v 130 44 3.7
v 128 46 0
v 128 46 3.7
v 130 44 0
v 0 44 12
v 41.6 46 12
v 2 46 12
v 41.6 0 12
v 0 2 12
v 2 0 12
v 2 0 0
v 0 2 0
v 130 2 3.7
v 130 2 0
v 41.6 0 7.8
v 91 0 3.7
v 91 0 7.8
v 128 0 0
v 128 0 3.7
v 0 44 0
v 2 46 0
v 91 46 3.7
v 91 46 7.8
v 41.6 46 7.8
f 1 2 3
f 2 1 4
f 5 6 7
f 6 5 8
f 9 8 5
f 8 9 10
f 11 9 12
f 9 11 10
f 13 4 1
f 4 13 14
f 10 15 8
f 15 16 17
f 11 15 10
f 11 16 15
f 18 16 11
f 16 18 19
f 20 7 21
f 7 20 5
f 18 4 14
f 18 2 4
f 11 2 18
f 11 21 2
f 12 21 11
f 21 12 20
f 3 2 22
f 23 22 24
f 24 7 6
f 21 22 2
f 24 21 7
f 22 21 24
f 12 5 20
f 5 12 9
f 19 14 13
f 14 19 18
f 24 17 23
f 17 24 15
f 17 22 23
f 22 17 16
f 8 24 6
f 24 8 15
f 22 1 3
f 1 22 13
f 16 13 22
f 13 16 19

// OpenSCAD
$fn = 32;

// ----------------------------------------------------------------------
// Stepped bar: twostep, 130 x 46 x 12/3.7 mm
// ----------------------------------------------------------------------

// --- parameters (mm) ---
bar_l = 130;              // bar length, X
bar_w = 46;               // bar width, Y
plate_t = 12;             // thickness of the thick zone, Z
thin_t = 3.7;             // thickness of the thin zone
corner_c = 2;             // corner chamfer of the bar
step_cut = 8.3;           // material removed from the thin zone
stair1_x = 41.6;          // position of the first stair
stair2_x = 91;            // position of the second stair
mid_t = 7.8;              // thickness of the middle zone
depth_1 = 4.2;            // depth of cut 1 from the top face
depth_2 = 8.3;            // depth of cut 2 from the top face
fit_tol = 0.1;            // declared fit tolerance (prompt contract)
free_tol = 0.3;           // declared free tolerance (prompt contract)

profile = [[2, 0], [128, 0], [130, 2], [130, 44], [128, 46], [2, 46], [0, 44], [0, 2]];  // primary outline, 8 points, counter clockwise
void_1 = [[41.6, -1], [91, -1], [91, 47], [41.6, 47]];  // first stair, 4 points
void_2 = [[91, -1], [131, -1], [131, 47], [91, 47]];  // second stair, 4 points

// --- the one profile operation ---
difference() {
  linear_extrude(height = plate_t) polygon(points = profile);
  translate([0, 0, plate_t - depth_1])
    linear_extrude(height = depth_1 + 1) polygon(points = void_1);
  translate([0, 0, plate_t - depth_2])
    linear_extrude(height = depth_2 + 1) polygon(points = void_2);
}
